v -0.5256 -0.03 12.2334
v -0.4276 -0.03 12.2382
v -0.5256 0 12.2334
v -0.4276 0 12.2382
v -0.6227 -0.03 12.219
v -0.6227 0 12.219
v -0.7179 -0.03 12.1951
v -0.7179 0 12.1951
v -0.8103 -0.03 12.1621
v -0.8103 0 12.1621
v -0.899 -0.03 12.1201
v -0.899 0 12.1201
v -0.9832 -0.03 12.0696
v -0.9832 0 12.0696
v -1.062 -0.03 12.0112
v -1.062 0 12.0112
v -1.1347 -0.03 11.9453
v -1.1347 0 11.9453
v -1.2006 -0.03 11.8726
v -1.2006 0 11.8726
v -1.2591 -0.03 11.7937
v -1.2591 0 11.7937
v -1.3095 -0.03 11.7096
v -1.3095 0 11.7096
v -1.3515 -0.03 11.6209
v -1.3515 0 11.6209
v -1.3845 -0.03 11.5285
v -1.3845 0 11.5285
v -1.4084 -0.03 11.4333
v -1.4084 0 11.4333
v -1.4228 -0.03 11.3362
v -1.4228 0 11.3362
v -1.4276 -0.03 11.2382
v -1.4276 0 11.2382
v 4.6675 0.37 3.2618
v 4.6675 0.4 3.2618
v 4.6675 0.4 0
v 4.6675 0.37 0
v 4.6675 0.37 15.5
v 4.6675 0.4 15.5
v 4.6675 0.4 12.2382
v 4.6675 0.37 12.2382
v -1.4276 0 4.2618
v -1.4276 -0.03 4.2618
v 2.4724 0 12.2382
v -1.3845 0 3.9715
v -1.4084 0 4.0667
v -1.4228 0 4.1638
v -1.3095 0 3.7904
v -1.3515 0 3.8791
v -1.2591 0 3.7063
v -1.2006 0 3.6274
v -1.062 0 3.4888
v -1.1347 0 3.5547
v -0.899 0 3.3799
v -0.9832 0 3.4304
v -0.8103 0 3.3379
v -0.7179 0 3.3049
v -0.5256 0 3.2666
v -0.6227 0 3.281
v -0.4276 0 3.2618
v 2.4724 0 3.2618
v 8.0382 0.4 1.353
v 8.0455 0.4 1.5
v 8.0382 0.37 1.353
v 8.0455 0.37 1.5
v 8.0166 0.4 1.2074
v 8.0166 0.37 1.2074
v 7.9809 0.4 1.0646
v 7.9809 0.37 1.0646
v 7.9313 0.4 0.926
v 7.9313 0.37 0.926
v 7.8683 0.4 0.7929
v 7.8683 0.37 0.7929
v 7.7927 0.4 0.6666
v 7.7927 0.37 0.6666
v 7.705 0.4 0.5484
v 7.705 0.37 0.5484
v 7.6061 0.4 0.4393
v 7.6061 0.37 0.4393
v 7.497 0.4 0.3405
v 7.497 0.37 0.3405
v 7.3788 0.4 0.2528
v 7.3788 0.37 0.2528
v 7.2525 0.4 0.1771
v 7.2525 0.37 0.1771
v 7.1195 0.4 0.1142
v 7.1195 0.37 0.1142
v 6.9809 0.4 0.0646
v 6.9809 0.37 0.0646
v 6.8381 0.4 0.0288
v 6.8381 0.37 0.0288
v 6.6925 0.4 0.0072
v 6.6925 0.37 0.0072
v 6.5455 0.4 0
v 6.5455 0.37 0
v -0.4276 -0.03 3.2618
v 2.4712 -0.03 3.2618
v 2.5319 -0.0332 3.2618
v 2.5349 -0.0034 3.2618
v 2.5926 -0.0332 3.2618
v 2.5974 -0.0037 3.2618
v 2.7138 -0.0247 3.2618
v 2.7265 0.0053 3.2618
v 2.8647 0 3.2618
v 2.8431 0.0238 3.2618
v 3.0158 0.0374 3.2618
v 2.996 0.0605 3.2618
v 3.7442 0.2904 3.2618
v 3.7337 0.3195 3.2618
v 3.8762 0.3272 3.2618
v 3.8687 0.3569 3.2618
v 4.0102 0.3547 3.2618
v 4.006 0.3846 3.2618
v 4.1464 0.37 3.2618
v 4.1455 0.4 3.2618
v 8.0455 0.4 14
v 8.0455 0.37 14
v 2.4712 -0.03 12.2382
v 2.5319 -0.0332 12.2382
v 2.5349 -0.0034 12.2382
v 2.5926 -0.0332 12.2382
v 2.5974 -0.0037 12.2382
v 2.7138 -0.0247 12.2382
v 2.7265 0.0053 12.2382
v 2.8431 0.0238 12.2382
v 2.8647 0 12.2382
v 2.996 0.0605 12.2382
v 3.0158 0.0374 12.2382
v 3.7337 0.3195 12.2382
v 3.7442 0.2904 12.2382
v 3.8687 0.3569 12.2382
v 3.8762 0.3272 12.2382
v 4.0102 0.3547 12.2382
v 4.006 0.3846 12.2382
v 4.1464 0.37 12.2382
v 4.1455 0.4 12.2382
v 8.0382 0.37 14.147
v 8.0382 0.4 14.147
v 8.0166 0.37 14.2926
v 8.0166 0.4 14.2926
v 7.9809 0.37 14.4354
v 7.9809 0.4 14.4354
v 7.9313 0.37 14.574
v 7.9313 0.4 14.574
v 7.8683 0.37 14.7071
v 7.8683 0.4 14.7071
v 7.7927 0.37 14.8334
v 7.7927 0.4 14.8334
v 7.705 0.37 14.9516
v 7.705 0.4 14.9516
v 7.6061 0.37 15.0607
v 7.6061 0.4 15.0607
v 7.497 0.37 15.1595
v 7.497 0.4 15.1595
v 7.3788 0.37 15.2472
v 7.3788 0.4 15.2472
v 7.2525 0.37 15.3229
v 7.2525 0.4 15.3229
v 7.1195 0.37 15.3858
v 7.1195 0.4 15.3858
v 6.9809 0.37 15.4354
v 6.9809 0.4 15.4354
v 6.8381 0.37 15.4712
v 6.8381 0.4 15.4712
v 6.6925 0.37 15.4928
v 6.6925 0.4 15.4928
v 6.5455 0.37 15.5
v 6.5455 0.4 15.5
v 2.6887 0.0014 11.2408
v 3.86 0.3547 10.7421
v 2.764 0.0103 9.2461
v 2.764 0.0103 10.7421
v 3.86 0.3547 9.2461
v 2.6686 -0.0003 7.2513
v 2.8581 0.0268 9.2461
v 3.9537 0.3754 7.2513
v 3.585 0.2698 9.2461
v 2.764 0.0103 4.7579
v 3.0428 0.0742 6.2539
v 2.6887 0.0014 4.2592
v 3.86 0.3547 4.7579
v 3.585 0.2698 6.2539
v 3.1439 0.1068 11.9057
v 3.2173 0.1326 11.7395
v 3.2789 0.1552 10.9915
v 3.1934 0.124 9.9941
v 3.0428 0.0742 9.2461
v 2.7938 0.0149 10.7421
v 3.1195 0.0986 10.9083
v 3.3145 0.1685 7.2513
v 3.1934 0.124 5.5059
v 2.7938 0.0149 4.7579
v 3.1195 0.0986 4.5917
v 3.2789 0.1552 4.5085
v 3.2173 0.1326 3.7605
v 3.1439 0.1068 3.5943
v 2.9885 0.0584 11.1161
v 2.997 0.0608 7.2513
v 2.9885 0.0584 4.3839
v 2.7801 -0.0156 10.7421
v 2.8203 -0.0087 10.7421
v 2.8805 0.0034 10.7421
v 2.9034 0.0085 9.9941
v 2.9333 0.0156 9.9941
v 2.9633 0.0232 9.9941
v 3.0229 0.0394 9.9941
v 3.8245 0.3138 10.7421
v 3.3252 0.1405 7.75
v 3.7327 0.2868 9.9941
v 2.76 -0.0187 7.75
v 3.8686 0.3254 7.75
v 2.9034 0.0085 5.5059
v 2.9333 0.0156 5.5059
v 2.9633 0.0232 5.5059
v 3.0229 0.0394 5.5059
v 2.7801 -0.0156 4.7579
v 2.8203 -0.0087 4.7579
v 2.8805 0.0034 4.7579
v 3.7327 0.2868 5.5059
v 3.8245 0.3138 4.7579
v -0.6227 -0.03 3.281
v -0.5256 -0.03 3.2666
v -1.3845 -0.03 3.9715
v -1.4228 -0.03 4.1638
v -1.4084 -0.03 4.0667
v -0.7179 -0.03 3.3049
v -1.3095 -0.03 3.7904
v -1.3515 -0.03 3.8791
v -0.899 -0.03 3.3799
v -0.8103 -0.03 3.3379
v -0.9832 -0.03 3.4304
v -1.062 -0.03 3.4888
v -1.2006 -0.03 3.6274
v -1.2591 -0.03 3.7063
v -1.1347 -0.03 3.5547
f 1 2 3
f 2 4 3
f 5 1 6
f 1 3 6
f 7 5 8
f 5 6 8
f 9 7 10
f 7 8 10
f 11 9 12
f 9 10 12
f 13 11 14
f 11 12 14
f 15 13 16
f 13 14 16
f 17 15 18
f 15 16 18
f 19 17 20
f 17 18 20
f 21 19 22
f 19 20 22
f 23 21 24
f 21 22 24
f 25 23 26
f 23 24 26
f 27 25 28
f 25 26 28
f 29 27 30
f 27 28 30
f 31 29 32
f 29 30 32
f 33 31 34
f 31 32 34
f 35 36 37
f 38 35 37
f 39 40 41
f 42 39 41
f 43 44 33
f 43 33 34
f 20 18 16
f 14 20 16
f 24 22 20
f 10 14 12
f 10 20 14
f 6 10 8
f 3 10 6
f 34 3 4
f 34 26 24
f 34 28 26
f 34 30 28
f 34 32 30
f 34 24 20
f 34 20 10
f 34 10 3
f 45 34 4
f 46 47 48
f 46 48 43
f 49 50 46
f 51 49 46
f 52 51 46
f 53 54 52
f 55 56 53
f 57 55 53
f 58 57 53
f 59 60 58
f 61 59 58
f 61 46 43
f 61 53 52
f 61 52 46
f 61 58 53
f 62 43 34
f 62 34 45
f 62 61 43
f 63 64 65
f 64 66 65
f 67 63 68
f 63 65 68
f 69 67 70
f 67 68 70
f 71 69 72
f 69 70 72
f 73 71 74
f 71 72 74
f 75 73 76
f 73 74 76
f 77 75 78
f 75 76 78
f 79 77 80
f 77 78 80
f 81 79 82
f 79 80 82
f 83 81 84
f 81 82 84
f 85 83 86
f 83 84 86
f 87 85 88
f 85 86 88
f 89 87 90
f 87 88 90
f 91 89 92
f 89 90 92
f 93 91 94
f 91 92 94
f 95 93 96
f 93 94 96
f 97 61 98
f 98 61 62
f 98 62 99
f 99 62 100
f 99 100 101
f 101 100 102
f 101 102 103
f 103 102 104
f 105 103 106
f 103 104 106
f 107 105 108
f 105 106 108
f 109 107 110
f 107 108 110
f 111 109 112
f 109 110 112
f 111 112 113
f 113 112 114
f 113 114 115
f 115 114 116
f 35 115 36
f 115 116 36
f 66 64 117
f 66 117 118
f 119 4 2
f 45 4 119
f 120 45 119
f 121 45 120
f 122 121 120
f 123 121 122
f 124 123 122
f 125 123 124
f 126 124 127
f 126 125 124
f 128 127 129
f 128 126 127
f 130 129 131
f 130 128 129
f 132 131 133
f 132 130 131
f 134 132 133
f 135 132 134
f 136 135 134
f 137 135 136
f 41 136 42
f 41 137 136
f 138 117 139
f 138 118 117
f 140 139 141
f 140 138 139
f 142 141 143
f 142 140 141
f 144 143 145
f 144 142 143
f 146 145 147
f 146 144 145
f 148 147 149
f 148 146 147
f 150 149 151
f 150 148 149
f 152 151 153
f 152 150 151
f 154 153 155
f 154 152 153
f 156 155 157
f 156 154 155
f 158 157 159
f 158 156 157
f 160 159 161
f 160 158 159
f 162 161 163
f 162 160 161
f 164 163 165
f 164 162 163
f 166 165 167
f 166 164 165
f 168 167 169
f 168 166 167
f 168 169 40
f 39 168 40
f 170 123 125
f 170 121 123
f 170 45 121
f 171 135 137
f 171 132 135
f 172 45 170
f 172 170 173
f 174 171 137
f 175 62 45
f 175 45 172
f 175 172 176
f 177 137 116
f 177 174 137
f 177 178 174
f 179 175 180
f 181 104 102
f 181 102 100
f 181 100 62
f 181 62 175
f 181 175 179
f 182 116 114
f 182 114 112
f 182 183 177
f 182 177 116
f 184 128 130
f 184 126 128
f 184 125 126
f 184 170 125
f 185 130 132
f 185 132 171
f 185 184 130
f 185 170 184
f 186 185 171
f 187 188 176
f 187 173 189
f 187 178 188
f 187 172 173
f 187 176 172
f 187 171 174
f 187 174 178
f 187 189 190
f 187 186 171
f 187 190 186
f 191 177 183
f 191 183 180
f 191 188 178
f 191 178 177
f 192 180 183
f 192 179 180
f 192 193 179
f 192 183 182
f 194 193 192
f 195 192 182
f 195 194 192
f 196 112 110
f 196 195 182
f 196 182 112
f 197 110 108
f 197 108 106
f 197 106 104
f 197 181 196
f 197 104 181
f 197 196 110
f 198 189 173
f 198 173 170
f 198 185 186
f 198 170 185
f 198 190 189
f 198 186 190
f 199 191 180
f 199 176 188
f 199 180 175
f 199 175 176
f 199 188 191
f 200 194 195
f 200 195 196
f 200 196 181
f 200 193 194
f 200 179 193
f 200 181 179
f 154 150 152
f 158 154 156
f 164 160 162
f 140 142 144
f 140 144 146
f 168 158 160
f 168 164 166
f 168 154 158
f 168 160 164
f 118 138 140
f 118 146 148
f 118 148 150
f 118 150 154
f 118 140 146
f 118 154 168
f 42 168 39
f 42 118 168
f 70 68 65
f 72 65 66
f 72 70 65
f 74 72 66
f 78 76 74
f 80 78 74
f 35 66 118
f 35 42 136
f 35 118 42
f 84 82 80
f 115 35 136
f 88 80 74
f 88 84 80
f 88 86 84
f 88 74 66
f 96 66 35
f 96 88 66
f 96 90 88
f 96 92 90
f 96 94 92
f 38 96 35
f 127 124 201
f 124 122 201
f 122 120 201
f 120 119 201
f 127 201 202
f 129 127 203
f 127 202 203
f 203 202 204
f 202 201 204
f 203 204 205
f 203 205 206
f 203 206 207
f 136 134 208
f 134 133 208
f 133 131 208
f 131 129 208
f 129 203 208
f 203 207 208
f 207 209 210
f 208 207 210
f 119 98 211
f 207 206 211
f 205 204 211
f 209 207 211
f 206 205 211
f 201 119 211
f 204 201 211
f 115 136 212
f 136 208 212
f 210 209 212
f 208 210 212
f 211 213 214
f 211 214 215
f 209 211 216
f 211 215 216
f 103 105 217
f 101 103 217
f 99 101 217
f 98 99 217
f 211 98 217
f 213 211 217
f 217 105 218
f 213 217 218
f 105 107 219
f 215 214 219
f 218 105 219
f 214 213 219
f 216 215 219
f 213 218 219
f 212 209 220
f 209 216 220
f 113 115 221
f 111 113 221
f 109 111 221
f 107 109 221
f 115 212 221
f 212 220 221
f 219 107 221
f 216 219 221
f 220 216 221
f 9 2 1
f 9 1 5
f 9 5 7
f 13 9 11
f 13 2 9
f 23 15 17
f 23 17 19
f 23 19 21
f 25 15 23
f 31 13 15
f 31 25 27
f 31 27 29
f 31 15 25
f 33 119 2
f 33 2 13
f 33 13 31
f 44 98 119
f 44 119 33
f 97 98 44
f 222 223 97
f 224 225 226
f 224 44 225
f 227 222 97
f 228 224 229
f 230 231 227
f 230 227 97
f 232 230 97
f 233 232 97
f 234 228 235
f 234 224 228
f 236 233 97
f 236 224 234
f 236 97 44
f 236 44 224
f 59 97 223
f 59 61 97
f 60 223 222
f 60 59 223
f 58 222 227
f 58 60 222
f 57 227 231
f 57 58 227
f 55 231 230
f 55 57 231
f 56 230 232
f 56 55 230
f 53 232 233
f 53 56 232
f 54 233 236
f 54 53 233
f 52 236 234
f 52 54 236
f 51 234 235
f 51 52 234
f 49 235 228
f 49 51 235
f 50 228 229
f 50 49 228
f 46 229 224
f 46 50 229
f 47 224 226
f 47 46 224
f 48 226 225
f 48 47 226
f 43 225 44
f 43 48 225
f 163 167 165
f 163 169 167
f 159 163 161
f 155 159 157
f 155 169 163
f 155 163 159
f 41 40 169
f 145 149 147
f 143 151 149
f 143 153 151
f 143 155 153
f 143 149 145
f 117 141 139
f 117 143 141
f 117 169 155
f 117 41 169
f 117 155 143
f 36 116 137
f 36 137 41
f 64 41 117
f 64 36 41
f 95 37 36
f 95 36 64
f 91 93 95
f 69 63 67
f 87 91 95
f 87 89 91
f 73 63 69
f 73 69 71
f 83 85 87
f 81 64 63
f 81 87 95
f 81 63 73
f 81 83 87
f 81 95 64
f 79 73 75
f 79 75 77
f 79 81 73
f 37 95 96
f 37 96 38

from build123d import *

# Parameters (mm, degrees)
BOSS_EXTRUDE1_DEPTH = 15.5
FILLET1_R           = 1.5
SKETCH3_W           = 6.938477294
SKETCH3_H           = 4.706519562
CUT_EXTRUDE2_DEPTH  = 15.5
FILLET2_R           = 1


with BuildPart() as part:
    # Sketch1 → Boss-Extrude1 (new body)
    with BuildSketch(Plane.XY):
        with BuildLine():
            Line((-1.427597117, 0), (2.472402883, 0))
            add(Edge.make_bspline(
                [(2.472402883, 0), (3.072460434, -0.048698197), (3.560293386, 0.364713913), (4.145454545, 0.4)],
                knots=[0, 0, 0, 0, 1, 1, 1, 1], degree=3))
            Line((4.145454545, 0.4), (8.045454545, 0.4))
            Line((8.045454545, 0.4), (8.045454545, 0.37))
            Line((8.045454545, 0.37), (4.146363347, 0.37))
            add(Edge.make_bspline(
                [(2.471195031, -0.03), (2.760549874, -0.053194299), (3.338778541, 0.131190612), (3.862676211, 0.35269873), (4.146363347, 0.37)],
                knots=[0.000660696, 0.000660696, 0.000660696, 0.000660696, 0.500069024, 0.999477352, 0.999477352, 0.999477352, 0.999477352], degree=3))
            Line((2.471195031, -0.03), (-1.427597117, -0.03))
            Line((-1.427597117, -0.03), (-1.427597117, 0))
        make_face()
    extrude(amount=BOSS_EXTRUDE1_DEPTH)

    # Fillet1
    fillet1_edges = [part.edges().sort_by_distance(p)[0] for p in [
        (8.045454545, 0.385, 15.5),
        (8.045454545, 0.385, 0),
    ]]
    fillet(fillet1_edges, radius=FILLET1_R)

    # Sketch3 → Cut-Extrude2 (cut)
    with BuildSketch(Plane(origin=(0, 0.4, 0), x_dir=(1, 0, 0), z_dir=(0, 1, 0))):
        with Locations((1.198273034, -0.908564347)):
            Rectangle(SKETCH3_W, SKETCH3_H)
        with Locations((1.198273034, -14.591435653)):
            Rectangle(SKETCH3_W, SKETCH3_H)
    extrude(amount=-CUT_EXTRUDE2_DEPTH, mode=Mode.SUBTRACT)

    # Fillet2
    fillet2_edges = [part.edges().sort_by_distance(p)[0] for p in [
        (-1.427597117, -0.015, 3.261824128),
        (-1.427597117, -0.015, 12.238175872),
    ]]
    fillet(fillet2_edges, radius=FILLET2_R)


solid = part.part
